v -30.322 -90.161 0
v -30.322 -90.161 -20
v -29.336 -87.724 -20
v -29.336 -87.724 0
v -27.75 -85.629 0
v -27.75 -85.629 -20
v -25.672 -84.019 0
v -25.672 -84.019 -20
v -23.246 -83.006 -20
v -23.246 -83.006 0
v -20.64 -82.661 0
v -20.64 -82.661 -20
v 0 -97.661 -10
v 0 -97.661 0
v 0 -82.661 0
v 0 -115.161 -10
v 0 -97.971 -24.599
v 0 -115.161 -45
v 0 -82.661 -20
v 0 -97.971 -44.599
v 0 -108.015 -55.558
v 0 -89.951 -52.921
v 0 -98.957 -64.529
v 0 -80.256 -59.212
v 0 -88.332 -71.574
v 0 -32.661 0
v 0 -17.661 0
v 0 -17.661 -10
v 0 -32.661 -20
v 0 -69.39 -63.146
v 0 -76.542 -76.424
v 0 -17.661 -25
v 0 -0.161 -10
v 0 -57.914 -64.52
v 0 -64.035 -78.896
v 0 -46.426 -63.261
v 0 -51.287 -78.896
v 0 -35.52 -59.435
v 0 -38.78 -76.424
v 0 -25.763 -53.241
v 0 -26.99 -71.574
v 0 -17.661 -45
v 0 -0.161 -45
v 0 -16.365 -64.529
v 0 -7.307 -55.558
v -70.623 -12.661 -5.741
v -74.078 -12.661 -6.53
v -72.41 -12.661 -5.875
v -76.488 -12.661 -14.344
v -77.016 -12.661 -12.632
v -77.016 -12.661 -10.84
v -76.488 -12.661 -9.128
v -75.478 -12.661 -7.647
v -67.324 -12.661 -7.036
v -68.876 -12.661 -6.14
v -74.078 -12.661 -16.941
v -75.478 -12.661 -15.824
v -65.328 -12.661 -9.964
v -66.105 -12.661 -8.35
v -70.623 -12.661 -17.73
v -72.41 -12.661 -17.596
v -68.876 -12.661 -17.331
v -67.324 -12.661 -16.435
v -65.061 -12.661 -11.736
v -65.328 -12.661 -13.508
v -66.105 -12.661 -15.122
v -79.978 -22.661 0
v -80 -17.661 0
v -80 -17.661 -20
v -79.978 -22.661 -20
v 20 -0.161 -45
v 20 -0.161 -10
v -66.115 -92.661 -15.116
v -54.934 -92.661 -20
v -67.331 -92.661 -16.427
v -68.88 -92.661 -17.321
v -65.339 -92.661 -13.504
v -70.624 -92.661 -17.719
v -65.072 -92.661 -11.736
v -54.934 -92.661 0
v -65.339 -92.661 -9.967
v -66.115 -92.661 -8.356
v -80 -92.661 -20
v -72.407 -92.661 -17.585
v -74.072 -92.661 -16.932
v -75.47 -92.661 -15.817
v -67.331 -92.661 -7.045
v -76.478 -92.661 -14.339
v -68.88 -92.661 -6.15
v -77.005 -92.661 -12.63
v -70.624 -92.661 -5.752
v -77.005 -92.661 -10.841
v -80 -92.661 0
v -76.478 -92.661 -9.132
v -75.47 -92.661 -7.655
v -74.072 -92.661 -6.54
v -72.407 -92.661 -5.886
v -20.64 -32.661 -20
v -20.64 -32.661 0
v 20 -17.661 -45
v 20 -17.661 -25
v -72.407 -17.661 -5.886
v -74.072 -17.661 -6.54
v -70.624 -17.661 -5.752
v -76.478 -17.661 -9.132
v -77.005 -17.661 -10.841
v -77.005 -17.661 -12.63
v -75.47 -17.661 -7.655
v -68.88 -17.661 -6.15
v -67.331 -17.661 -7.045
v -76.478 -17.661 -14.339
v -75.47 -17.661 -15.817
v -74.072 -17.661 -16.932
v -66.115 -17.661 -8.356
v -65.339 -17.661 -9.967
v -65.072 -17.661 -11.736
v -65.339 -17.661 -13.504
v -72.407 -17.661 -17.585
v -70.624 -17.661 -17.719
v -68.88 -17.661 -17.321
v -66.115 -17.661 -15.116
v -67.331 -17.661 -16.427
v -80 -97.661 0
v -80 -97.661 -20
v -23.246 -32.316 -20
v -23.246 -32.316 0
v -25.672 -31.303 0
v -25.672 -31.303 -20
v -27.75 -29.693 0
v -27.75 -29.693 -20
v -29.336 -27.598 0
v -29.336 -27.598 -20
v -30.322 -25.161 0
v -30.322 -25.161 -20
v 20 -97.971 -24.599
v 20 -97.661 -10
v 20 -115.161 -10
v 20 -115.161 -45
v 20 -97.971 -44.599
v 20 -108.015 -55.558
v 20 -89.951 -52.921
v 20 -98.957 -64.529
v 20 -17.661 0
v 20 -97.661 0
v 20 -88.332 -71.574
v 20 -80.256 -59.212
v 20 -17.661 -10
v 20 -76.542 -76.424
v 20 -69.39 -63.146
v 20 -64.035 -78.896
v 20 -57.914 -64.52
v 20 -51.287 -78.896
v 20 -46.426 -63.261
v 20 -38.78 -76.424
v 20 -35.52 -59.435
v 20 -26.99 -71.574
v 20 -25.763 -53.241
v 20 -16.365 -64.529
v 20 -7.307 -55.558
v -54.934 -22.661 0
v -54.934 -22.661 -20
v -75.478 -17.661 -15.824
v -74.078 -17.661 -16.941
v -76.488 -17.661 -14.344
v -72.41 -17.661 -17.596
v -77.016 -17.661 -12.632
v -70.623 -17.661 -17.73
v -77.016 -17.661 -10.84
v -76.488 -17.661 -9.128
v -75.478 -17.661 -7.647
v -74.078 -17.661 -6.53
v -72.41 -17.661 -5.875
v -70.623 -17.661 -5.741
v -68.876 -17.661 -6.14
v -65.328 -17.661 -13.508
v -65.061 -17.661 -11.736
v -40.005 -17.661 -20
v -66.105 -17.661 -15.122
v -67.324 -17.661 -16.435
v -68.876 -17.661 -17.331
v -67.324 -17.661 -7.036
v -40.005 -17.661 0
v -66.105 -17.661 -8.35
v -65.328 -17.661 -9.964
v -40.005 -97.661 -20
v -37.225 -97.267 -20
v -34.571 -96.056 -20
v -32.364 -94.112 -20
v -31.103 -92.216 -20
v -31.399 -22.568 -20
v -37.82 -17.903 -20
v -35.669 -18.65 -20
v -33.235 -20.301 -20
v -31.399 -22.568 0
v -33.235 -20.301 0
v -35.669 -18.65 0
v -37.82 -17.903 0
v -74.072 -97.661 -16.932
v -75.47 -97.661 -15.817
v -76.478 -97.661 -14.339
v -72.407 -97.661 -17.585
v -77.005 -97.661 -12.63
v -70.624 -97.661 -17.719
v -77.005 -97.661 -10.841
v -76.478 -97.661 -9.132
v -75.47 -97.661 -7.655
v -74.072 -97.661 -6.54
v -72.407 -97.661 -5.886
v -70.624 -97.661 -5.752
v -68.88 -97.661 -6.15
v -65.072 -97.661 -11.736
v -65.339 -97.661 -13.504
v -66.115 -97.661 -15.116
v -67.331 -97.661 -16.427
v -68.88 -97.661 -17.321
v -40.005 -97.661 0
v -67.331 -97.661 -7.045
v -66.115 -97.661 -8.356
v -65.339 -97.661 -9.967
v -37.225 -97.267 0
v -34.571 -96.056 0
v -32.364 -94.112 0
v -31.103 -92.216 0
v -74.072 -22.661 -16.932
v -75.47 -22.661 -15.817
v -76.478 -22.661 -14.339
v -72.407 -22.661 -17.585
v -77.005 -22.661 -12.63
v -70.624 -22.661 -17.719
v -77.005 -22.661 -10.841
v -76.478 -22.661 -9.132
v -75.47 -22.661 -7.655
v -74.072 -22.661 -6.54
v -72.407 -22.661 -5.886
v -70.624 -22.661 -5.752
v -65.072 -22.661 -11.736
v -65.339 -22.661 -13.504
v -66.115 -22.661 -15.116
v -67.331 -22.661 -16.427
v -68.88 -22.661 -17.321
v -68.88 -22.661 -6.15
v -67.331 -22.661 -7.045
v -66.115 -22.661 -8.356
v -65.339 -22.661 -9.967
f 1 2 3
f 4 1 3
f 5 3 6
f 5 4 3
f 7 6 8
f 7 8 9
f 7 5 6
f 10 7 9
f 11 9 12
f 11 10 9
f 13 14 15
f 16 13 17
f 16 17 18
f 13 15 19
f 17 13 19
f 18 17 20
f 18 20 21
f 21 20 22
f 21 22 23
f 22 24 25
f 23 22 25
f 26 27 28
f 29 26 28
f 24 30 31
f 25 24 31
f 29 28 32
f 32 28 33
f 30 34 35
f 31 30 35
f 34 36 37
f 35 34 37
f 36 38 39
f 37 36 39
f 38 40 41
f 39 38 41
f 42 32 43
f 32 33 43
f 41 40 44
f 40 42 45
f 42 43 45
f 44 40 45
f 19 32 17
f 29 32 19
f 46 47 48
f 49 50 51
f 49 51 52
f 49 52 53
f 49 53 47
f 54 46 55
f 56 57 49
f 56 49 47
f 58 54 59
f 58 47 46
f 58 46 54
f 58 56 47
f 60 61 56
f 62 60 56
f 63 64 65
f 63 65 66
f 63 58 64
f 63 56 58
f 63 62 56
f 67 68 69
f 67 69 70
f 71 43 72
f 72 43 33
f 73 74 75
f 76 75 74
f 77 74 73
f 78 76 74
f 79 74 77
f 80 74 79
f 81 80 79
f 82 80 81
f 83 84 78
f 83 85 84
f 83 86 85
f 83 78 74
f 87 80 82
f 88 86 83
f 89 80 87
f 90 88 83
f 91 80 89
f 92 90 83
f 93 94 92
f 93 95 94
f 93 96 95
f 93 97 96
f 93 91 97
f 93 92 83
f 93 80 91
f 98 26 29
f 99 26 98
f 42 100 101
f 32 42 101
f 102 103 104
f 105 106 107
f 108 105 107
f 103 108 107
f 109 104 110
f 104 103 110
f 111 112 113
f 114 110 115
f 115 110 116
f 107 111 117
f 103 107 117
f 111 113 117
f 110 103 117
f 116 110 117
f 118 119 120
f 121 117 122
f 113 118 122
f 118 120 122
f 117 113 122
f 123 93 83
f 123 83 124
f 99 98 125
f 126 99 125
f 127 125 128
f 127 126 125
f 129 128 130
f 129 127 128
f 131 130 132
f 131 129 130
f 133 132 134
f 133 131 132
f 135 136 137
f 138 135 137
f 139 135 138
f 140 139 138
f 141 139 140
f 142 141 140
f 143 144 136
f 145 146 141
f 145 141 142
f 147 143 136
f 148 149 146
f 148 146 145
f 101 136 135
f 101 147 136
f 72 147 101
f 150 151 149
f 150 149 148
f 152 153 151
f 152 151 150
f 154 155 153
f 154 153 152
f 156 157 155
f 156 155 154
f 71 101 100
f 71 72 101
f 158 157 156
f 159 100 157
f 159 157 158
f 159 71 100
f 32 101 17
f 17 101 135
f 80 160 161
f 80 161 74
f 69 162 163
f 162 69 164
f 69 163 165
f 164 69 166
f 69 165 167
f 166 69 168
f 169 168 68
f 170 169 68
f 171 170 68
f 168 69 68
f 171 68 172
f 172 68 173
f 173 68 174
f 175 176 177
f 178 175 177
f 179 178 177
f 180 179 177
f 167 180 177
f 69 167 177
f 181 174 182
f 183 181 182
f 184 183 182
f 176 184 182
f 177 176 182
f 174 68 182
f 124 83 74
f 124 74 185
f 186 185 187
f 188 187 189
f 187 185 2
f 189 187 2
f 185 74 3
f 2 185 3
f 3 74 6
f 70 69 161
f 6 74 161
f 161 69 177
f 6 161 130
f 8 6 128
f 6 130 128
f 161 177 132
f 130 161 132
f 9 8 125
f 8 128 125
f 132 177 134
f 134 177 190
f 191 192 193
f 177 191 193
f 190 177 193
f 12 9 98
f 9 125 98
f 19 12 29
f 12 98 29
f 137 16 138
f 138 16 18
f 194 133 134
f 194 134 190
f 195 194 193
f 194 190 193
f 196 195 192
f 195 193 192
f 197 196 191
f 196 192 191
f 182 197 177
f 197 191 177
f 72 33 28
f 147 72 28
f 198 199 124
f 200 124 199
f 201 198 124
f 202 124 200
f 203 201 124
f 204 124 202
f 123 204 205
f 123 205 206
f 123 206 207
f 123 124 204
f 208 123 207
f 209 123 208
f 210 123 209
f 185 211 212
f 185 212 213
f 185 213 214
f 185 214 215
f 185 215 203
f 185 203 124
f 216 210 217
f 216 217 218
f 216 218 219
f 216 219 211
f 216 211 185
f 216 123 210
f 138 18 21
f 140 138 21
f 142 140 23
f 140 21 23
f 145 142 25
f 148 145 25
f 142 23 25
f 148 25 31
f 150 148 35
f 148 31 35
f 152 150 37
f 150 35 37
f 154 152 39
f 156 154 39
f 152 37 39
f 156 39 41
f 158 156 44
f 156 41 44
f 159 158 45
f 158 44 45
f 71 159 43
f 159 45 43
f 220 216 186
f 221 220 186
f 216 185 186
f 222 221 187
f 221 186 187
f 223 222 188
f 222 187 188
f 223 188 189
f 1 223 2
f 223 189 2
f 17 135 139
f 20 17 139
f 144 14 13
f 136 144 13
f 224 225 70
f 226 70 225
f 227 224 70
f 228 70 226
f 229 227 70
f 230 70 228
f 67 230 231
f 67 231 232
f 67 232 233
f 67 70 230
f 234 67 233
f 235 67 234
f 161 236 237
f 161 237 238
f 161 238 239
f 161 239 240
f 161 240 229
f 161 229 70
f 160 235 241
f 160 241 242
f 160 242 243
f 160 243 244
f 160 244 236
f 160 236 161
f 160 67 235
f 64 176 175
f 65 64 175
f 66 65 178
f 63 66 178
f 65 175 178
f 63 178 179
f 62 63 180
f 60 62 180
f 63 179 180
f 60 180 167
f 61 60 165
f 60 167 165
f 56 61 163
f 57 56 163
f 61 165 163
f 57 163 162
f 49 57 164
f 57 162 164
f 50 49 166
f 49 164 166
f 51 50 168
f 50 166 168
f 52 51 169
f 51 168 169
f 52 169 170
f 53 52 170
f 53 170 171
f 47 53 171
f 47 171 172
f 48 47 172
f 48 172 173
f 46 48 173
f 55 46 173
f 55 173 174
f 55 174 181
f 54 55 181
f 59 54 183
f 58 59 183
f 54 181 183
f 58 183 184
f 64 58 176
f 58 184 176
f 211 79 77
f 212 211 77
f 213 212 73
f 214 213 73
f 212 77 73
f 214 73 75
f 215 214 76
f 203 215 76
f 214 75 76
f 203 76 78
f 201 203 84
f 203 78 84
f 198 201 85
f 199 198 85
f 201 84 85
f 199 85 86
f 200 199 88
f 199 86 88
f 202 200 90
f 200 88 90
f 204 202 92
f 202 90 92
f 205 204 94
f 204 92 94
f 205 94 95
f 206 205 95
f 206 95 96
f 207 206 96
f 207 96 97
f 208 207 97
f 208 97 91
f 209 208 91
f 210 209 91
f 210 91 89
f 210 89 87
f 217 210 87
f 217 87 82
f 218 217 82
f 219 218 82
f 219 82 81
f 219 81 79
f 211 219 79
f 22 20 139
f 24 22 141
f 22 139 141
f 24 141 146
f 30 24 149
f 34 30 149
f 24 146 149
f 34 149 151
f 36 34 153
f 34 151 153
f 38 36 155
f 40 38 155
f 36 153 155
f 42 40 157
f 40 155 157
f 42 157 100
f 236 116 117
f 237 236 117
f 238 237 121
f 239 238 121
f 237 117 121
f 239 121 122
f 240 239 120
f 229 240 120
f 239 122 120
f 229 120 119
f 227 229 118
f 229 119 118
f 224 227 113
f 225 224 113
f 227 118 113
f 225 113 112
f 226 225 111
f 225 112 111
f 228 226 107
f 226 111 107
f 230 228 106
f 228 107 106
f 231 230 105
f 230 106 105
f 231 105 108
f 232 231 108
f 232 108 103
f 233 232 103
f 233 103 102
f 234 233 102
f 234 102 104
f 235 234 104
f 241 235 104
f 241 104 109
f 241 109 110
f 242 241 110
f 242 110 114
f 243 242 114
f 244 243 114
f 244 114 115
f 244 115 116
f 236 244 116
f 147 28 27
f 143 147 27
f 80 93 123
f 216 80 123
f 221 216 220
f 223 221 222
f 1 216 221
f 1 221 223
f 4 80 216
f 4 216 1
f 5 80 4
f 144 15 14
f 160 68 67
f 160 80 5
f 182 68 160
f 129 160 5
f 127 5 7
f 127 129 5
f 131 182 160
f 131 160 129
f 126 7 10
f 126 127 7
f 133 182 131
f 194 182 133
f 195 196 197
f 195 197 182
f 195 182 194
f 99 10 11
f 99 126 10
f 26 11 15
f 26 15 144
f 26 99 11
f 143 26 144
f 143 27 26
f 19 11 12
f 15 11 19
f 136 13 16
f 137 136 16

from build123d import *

# Parameters (mm, degrees)
BOSS_EXTRUDE3_DEPTH = 20
CUT_EXTRUDE3_DEPTH  = 20
BOSS_EXTRUDE4_DEPTH = 20
SKETCH5_W           = 10
SKETCH5_H           = 5
EXTRUDE_THIN1_DEPTH = 20
FILLET1_R           = 10
FILLET2_R           = 10
SKETCH6_R           = 6
CUT_EXTRUDE5_DEPTH  = 98.5
SKETCH7_W           = 25.027670854
SKETCH7_H           = 6.25
SKETCH7_W_2         = 25.066409398
CUT_EXTRUDE6_DEPTH  = 80.207653836
SKETCH8_R           = 6.011095122
BOSS_EXTRUDE6_DEPTH = 5
CUT_EXTRUDE9_DEPTH  = 35


with BuildPart() as part:
    # Sketch1 → Boss-Extrude3 (new body)
    with BuildSketch(Plane(origin=(0, 0, 0), x_dir=(0, 0, -1), z_dir=(1, 0, 0))):
        with BuildLine():
            Line((0, -17.661005955), (0, -97.661005955))
            Line((0, -97.661005955), (10, -97.661005955))
            Line((10, -97.661005955), (10, -115.161005955))
            Line((10, -115.161005955), (45, -115.161005955))
            ThreePointArc((45, -115.161005955), (79.207653836, -57.661005955), (45, -0.161005955))
            Line((45, -0.161005955), (10, -0.161005955))
            Line((10, -0.161005955), (10, -17.661005955))
            Line((10, -17.661005955), (0, -17.661005955))
        make_face()
    extrude(amount=BOSS_EXTRUDE3_DEPTH)

    # Sketch3 → Cut-Extrude3 (cut)
    with BuildSketch(Plane(origin=(20, 0, 0), x_dir=(0, 0, -1), z_dir=(1, 0, 0))):
        with BuildLine():
            Line((45, -17.661005955), (25, -17.661005955))
            Line((25, -17.661005955), (24.599094088, -97.970728365))
            Line((24.599094088, -97.970728365), (44.599094088, -97.970728365))
            ThreePointArc((44.599094088, -97.970728365), (64.519852612, -57.914310871), (45, -17.661005955))
        make_face()
    extrude(amount=-CUT_EXTRUDE3_DEPTH, mode=Mode.SUBTRACT)

    # Sketch4 → Boss-Extrude4 (add)
    with BuildSketch(Plane.XY):
        with BuildLine():
            Line((0, -17.661005955), (0, -32.661005955))
            Line((0, -32.661005955), (-20.64, -32.661005955))
            ThreePointArc((-20.64, -32.661005955), (-27.711067812, -29.732073767), (-30.64, -22.661005955))
            Line((-30.64, -22.661005955), (-40.64, -22.661005955))
            Line((-40.64, -22.661005955), (-40.64, -17.661005955))
            Line((-40.64, -17.661005955), (-80, -17.661005955))
            Line((-80, -17.661005955), (-79.933590602, -32.660858947))
            Line((-79.933590602, -32.660858947), (-54.933590602, -32.660858947))
            Line((-54.933590602, -32.660858947), (-54.933590602, -82.661005955))
            Line((-54.933590602, -82.661005955), (-80, -82.661005955))
            Line((-80, -82.661005955), (-80, -97.661005955))
            Line((-80, -97.661005955), (-40.64, -97.661005955))
            Line((-40.64, -97.661005955), (-40.64, -92.661005955))
            Line((-40.64, -92.661005955), (-30.64, -92.661005955))
            ThreePointArc((-30.64, -92.661005955), (-27.711067812, -85.589938143), (-20.64, -82.661005955))
            Line((-20.64, -82.661005955), (0, -82.661005955))
            Line((0, -82.661005955), (0, -97.661005955))
            Line((0, -97.661005955), (20, -97.661005955))
            Line((20, -97.661005955), (20, -17.661005955))
            Line((20, -17.661005955), (0, -17.661005955))
        make_face()
    extrude(amount=-BOSS_EXTRUDE4_DEPTH)

    # Sketch5 → Extrude-Thin1 (add)
    with BuildSketch(Plane.XY):
        with Locations((-35.64, -20.161005955)):
            Rectangle(SKETCH5_W, SKETCH5_H)
        with Locations((-35.64, -95.161005955)):
            Rectangle(SKETCH5_W, SKETCH5_H)
    extrude(amount=-EXTRUDE_THIN1_DEPTH)

    # Fillet1
    fillet1_edges = [part.edges().sort_by_distance(p)[0] for p in [
        (-30.64, -22.661005955, -10),
        (-30.64, -17.661005955, -10),
    ]]
    fillet(fillet1_edges, radius=FILLET1_R)

    # Fillet2
    fillet2_edges = [part.edges().sort_by_distance(p)[0] for p in [
        (-30.64, -97.661005955, -10),
        (-30.64, -92.661005955, -10),
    ]]
    fillet(fillet2_edges, radius=FILLET2_R)

    # Sketch6 → Cut-Extrude5 (cut, through all)
    with BuildSketch(Plane(origin=(0, -17.661005955, 0), x_dir=(1, 0, 0), z_dir=(0, 1, 0))):
        with Locations((-71.071972719, 11.735710253)):
            Circle(SKETCH6_R)
    extrude(amount=-CUT_EXTRUDE5_DEPTH, mode=Mode.SUBTRACT)

    # Sketch7 → Cut-Extrude6 (cut, through all)
    with BuildSketch(Plane.XY):
        with Locations((-67.447426029, -29.535858947)):
            Rectangle(SKETCH7_W, SKETCH7_H)
        with Locations((-67.466795301, -85.786005955)):
            Rectangle(SKETCH7_W_2, SKETCH7_H)
    extrude(amount=-CUT_EXTRUDE6_DEPTH, mode=Mode.SUBTRACT)

    # Sketch8 → Boss-Extrude6 (add)
    with BuildSketch(Plane(origin=(0, -17.661005955, 0), x_dir=(1, 0, 0), z_dir=(0, 1, 0))):
        with Locations((-71.071972719, 11.735710253)):
            Circle(SKETCH8_R)
    extrude(amount=BOSS_EXTRUDE6_DEPTH)

    # Sketch9 → Cut-Extrude9 (cut)
    with BuildSketch(Plane.XY):
        Polygon((-83.496027852, -22.661005955), (-54.933590602, -22.661005955), (-54.933590602, -92.661005955), (-84.905926437, -92.661005955), align=None)
    extrude(amount=-CUT_EXTRUDE9_DEPTH, mode=Mode.SUBTRACT)


solid = part.part
